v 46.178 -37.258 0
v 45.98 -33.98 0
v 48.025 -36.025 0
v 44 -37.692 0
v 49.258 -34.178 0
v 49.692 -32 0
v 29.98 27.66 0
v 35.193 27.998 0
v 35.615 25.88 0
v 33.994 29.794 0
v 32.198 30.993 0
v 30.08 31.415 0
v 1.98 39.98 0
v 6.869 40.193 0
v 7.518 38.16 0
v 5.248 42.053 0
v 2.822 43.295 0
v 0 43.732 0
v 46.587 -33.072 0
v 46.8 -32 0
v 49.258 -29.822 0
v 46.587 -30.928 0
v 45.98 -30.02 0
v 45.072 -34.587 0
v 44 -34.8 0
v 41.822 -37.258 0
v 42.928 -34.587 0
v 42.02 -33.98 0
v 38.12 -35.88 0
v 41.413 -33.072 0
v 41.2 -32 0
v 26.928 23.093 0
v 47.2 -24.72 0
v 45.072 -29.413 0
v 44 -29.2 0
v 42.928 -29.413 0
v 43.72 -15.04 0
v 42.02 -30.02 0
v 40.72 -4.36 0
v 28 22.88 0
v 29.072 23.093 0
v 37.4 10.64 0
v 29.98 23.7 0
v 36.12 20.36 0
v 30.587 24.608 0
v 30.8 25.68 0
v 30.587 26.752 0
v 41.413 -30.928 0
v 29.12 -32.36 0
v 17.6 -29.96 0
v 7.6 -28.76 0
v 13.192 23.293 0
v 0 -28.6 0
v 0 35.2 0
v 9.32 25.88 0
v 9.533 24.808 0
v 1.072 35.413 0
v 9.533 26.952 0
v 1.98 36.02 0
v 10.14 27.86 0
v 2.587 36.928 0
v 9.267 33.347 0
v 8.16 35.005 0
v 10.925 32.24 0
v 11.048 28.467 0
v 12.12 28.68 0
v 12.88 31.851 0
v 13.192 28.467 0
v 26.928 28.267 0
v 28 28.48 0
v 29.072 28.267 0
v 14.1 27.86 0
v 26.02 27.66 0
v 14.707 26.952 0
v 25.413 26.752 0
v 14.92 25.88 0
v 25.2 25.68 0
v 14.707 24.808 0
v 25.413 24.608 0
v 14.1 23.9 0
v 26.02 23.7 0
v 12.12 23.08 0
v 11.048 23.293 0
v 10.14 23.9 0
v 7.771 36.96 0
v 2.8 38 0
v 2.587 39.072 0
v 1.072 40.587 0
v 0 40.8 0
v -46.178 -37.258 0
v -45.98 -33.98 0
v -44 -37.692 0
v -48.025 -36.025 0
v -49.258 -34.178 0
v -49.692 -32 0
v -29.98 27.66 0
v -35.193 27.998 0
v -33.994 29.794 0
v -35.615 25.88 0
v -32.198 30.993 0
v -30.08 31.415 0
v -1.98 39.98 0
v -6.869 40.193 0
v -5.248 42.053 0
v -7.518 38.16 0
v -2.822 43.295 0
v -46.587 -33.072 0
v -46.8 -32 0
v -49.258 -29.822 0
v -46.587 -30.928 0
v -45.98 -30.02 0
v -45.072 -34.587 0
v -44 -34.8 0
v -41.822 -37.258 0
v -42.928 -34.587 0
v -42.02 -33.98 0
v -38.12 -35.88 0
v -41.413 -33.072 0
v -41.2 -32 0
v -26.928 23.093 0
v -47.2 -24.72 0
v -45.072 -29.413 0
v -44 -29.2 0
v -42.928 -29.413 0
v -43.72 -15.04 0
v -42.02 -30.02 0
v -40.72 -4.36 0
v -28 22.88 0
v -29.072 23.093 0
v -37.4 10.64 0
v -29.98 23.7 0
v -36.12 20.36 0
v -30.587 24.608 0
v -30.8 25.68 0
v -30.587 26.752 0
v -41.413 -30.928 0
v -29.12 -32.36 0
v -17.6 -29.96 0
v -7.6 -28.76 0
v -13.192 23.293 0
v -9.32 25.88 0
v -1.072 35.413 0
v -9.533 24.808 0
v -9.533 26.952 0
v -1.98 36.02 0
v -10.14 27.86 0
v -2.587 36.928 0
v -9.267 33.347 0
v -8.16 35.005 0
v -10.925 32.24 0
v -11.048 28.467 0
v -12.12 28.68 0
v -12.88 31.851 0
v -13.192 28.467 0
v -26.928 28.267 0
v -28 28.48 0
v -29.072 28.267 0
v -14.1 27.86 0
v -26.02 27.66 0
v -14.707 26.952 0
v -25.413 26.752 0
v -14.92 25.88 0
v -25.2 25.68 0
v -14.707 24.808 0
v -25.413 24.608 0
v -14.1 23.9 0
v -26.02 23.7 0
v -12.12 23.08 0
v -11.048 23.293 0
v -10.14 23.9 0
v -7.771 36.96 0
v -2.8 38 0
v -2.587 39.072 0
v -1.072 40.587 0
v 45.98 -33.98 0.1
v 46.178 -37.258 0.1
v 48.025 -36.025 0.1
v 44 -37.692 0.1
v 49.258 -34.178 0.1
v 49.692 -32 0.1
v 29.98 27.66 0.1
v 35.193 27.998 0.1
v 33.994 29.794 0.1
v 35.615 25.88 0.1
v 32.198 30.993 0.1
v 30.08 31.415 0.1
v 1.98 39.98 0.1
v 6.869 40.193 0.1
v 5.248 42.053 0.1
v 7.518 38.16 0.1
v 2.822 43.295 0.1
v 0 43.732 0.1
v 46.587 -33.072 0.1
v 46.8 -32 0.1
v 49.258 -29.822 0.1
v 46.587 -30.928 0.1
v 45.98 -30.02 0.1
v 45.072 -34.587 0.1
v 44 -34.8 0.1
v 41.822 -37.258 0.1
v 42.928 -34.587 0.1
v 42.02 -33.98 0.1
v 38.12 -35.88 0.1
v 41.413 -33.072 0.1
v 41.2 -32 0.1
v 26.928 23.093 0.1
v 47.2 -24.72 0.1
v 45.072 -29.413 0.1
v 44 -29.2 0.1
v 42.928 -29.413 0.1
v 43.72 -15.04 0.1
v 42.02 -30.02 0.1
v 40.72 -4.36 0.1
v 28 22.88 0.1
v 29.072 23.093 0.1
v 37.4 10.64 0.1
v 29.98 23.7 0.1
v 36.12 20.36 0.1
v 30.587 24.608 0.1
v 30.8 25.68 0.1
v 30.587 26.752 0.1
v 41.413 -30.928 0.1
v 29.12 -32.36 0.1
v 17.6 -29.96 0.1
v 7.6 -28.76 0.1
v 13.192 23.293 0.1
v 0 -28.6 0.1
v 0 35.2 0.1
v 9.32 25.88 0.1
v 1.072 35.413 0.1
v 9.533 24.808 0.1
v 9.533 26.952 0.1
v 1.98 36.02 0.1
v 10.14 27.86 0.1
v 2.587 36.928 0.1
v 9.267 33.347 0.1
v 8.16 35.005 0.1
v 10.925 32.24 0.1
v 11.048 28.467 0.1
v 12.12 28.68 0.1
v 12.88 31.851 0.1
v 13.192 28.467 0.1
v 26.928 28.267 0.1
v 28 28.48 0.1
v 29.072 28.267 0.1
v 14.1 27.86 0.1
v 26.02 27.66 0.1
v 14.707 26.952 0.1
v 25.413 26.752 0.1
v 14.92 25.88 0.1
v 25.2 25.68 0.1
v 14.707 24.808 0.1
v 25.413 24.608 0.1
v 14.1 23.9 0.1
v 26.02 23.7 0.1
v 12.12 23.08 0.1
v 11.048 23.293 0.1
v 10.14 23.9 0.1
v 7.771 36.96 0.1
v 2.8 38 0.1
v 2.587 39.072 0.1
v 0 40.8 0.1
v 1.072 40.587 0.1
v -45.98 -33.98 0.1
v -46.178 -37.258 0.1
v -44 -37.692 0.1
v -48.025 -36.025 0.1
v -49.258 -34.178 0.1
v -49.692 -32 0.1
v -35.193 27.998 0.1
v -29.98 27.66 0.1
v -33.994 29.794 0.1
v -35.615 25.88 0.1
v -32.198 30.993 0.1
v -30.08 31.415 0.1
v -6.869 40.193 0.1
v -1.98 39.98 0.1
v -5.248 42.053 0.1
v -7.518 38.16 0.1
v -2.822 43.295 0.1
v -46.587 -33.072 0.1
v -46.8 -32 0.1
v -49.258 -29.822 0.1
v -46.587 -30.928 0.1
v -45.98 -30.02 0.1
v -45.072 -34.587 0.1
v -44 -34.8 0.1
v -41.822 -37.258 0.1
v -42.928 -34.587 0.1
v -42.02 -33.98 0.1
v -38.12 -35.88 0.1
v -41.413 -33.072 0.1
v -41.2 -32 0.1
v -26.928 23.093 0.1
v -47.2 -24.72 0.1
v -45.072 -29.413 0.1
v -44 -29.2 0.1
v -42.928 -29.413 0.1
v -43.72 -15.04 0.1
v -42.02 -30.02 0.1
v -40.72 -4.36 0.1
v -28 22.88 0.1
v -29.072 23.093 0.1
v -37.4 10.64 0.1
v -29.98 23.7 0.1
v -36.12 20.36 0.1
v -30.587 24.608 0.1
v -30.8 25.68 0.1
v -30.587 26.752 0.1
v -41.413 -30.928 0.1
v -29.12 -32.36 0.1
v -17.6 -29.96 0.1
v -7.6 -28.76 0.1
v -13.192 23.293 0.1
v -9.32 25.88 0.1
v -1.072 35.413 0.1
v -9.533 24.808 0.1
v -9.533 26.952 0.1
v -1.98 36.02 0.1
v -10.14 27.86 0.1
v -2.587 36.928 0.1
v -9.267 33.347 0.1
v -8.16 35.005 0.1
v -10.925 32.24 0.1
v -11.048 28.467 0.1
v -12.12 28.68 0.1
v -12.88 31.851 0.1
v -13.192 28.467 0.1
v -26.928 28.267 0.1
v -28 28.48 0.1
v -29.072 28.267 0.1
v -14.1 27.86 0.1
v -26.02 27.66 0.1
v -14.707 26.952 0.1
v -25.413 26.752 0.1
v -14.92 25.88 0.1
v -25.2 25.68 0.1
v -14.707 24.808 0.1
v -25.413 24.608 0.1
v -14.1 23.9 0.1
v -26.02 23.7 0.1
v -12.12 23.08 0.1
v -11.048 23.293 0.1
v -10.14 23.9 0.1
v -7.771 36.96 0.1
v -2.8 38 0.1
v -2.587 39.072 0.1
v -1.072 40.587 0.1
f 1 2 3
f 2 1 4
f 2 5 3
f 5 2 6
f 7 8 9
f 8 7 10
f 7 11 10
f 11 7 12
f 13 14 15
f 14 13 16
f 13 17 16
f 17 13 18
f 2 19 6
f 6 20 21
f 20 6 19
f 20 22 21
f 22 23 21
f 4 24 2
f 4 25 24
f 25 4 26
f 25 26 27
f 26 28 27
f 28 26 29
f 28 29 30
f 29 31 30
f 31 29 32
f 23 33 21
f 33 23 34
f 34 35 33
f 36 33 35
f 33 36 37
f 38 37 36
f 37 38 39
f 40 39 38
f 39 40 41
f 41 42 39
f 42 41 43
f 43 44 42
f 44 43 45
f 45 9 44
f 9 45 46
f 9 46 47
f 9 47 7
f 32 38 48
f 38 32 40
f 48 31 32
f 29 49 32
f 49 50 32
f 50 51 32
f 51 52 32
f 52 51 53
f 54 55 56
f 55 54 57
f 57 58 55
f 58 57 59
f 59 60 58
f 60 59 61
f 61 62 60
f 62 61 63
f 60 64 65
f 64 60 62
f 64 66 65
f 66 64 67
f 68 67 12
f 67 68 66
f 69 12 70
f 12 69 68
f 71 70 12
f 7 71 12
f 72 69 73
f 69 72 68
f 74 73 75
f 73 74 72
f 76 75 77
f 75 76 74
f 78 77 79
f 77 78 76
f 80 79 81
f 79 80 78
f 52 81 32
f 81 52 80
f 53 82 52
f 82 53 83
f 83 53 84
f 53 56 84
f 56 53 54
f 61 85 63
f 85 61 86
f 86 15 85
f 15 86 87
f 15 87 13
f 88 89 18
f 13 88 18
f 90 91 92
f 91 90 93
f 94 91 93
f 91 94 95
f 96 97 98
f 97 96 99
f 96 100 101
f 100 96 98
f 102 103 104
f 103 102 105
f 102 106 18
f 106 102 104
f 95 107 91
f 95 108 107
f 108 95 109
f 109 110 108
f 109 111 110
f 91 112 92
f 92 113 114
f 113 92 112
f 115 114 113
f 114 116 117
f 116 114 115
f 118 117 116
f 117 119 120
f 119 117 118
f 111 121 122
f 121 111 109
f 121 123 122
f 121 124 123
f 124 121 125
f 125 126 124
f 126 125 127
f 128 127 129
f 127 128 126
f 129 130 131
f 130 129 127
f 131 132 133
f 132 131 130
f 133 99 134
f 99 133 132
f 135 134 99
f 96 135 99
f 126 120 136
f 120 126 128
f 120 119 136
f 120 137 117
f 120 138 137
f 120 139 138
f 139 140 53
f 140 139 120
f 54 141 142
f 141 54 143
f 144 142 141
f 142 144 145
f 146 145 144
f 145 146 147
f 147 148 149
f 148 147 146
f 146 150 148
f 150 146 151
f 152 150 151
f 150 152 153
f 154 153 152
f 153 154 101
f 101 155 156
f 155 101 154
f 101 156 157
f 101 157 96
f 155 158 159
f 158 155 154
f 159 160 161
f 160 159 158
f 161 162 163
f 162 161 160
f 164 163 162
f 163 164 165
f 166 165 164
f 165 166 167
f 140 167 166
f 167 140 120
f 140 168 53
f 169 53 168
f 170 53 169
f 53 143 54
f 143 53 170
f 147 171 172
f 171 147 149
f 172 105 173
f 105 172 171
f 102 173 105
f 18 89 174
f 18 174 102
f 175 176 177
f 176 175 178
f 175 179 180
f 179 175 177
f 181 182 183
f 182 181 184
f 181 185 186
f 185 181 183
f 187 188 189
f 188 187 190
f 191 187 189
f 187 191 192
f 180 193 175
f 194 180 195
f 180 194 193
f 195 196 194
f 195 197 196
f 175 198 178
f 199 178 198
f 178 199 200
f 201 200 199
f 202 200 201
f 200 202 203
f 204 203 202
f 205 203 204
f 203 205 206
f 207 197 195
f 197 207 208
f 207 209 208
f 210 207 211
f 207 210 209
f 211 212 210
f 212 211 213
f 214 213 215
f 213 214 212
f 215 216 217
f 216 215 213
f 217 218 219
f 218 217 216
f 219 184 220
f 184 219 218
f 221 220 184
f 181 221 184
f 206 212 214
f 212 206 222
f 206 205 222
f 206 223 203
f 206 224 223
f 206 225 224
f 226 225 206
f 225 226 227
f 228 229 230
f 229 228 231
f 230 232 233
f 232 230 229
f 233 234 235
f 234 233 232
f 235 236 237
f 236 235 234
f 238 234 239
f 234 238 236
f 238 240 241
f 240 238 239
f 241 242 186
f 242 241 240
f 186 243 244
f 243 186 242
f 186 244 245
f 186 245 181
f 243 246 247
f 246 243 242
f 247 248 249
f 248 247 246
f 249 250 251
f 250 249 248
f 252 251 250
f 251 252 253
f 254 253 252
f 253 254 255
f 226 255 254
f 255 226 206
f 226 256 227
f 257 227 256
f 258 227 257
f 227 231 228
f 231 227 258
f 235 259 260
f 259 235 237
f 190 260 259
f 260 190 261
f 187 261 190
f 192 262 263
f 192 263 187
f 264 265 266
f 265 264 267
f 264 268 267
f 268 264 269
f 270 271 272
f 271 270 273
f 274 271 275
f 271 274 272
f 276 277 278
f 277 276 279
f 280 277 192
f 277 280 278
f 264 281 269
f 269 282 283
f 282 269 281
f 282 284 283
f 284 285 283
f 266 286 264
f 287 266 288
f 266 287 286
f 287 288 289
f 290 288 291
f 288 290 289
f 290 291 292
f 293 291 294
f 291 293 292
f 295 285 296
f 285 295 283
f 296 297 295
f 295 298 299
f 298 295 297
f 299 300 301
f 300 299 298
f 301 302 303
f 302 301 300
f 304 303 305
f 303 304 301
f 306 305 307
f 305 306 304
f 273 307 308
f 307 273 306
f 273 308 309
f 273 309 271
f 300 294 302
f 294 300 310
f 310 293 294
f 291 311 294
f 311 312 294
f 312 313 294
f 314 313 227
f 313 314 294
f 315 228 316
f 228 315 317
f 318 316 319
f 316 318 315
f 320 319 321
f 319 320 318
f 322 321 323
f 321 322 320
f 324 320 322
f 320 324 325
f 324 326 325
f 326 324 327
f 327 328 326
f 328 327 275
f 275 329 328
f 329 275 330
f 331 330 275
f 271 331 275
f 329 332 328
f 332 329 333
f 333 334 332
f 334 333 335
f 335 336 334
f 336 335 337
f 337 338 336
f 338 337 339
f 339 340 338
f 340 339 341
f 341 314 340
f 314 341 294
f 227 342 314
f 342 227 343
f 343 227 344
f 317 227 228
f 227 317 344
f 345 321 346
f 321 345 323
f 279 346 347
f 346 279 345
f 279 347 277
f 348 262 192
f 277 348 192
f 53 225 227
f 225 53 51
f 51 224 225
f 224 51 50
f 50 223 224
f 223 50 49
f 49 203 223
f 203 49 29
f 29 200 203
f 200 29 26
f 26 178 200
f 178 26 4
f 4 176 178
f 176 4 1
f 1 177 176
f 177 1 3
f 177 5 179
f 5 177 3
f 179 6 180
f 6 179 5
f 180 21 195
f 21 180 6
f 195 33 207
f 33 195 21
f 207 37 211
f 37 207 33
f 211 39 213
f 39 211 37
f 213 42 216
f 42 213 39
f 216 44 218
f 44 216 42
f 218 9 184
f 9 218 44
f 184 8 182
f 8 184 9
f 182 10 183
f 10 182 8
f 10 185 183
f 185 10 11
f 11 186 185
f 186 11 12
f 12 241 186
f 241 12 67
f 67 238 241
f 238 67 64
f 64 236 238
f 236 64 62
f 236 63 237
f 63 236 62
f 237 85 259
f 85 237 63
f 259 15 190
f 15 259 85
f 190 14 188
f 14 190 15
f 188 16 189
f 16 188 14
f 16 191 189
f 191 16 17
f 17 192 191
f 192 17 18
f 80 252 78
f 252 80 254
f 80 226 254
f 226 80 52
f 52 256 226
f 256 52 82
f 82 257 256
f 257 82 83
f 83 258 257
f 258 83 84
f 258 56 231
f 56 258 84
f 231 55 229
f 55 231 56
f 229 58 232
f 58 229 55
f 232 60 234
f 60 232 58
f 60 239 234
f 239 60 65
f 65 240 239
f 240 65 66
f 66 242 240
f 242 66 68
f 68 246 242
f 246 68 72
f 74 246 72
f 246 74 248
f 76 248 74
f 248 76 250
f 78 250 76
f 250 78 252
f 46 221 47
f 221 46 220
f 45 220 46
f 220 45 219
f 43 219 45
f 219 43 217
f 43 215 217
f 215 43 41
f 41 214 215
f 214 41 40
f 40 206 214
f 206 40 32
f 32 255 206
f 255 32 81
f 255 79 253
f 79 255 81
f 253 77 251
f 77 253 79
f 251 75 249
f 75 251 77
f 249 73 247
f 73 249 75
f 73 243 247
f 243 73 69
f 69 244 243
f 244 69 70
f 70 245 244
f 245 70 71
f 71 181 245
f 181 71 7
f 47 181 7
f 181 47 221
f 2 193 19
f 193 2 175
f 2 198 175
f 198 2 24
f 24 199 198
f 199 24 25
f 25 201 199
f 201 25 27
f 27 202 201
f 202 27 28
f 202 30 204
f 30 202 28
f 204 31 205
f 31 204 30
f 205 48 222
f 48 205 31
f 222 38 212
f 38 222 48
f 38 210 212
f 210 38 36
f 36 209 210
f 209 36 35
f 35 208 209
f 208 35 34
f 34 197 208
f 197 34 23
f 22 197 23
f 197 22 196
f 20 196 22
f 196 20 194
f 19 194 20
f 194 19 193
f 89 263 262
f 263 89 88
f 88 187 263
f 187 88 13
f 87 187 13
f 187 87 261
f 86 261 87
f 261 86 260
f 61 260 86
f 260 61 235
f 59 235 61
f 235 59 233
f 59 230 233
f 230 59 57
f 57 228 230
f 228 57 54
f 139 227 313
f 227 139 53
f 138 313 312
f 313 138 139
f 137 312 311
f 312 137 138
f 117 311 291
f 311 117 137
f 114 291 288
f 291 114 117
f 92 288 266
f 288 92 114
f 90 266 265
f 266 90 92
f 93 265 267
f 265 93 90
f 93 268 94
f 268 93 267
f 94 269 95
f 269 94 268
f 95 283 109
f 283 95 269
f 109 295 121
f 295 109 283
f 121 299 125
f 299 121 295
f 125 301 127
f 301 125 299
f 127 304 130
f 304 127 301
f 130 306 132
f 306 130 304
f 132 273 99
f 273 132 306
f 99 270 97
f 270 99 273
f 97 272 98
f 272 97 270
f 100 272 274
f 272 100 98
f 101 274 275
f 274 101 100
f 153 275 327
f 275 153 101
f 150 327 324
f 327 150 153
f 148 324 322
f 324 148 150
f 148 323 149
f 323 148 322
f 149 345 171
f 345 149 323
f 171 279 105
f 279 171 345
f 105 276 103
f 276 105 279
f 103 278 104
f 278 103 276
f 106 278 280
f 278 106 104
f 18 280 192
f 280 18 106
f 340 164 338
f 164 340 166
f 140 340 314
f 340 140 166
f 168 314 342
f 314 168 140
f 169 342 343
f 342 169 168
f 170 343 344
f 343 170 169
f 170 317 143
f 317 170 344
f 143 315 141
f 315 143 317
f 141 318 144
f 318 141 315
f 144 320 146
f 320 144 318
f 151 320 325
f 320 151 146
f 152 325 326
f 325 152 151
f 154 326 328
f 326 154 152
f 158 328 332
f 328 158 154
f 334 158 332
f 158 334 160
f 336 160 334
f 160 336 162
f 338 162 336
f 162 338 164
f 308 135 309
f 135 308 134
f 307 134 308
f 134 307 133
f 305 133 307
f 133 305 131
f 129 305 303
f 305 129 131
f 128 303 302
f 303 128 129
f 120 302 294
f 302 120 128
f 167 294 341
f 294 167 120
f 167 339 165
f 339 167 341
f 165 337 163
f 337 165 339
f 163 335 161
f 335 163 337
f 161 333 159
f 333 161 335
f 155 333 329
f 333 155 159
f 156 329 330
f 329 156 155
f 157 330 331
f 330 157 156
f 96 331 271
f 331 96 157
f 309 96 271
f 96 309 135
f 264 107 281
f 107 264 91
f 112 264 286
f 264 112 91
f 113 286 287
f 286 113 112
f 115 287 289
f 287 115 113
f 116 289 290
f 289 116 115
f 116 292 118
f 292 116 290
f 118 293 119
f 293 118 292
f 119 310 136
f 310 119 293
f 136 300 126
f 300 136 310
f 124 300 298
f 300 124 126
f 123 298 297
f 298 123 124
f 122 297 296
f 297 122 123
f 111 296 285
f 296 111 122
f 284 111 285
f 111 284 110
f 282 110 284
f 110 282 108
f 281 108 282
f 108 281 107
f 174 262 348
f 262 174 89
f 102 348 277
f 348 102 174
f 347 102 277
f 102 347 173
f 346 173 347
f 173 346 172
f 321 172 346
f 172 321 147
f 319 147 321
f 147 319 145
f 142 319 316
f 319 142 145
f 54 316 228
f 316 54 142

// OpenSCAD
use <../lib.scad>
use <s/u767s01.scad>
use <s/u767s02.scad>
function ldraw_lib__u767() = [
// 0 Sail 12 x 10 Trapezoidal
// 0 Name: u767.dat
// 0 Author: Philippe Hurbain [Philo]
// 0 !LDRAW_ORG Part UPDATE 2025-04
// 0 !LICENSE Licensed under CC BY 4.0 : see CAreadme.txt
// 
// 0 BFC CERTIFY CCW
  [0,"BFC","CERTIFY"],
  [0,"BFC","CCW"],
// 
// 0 !CATEGORY Sheet Fabric
// 
// 0 !HISTORY 2025-04-27 [OrionP] Official Update 2025-04
// 
// 
// 1 16 0 0 0 1 0 0 0 -1 0 0 0 1 s\u767s01.dat
  [1,16,0,0,0,1,0,0,0,-1,0,0,0,1, ldraw_lib__s__u767s01()],
// 1 16 0 0 0 -1 0 0 0 -1 0 0 0 1 s\u767s01.dat
  [1,16,0,0,0,-1,0,0,0,-1,0,0,0,1, ldraw_lib__s__u767s01()],
// 1 16 0 -.25 0 1 0 0 0 1 0 0 0 1 s\u767s01.dat
  [1,16,0,-.25,0,1,0,0,0,1,0,0,0,1, ldraw_lib__s__u767s01()],
// 1 16 0 -.25 0 -1 0 0 0 1 0 0 0 1 s\u767s01.dat
  [1,16,0,-.25,0,-1,0,0,0,1,0,0,0,1, ldraw_lib__s__u767s01()],
// 1 16 0 -.25 0 1 0 0 0 -1 0 0 0 1 s\u767s02.dat
  [1,16,0,-.25,0,1,0,0,0,-1,0,0,0,1, ldraw_lib__s__u767s02()],
// 1 16 0 -.25 0 -1 0 0 0 -1 0 0 0 1 s\u767s02.dat
  [1,16,0,-.25,0,-1,0,0,0,-1,0,0,0,1, ldraw_lib__s__u767s02()],
];
module ldraw_lib__u767(step=0, col=false, unit=2/5, alt=false, line=0.2, solid=!$preview)
    makepoly(ldraw_lib__u767(), step=step, col=col, unit=unit, alt=alt, line=line, solid=solid);
ldraw_lib__u767(line=0.2);
